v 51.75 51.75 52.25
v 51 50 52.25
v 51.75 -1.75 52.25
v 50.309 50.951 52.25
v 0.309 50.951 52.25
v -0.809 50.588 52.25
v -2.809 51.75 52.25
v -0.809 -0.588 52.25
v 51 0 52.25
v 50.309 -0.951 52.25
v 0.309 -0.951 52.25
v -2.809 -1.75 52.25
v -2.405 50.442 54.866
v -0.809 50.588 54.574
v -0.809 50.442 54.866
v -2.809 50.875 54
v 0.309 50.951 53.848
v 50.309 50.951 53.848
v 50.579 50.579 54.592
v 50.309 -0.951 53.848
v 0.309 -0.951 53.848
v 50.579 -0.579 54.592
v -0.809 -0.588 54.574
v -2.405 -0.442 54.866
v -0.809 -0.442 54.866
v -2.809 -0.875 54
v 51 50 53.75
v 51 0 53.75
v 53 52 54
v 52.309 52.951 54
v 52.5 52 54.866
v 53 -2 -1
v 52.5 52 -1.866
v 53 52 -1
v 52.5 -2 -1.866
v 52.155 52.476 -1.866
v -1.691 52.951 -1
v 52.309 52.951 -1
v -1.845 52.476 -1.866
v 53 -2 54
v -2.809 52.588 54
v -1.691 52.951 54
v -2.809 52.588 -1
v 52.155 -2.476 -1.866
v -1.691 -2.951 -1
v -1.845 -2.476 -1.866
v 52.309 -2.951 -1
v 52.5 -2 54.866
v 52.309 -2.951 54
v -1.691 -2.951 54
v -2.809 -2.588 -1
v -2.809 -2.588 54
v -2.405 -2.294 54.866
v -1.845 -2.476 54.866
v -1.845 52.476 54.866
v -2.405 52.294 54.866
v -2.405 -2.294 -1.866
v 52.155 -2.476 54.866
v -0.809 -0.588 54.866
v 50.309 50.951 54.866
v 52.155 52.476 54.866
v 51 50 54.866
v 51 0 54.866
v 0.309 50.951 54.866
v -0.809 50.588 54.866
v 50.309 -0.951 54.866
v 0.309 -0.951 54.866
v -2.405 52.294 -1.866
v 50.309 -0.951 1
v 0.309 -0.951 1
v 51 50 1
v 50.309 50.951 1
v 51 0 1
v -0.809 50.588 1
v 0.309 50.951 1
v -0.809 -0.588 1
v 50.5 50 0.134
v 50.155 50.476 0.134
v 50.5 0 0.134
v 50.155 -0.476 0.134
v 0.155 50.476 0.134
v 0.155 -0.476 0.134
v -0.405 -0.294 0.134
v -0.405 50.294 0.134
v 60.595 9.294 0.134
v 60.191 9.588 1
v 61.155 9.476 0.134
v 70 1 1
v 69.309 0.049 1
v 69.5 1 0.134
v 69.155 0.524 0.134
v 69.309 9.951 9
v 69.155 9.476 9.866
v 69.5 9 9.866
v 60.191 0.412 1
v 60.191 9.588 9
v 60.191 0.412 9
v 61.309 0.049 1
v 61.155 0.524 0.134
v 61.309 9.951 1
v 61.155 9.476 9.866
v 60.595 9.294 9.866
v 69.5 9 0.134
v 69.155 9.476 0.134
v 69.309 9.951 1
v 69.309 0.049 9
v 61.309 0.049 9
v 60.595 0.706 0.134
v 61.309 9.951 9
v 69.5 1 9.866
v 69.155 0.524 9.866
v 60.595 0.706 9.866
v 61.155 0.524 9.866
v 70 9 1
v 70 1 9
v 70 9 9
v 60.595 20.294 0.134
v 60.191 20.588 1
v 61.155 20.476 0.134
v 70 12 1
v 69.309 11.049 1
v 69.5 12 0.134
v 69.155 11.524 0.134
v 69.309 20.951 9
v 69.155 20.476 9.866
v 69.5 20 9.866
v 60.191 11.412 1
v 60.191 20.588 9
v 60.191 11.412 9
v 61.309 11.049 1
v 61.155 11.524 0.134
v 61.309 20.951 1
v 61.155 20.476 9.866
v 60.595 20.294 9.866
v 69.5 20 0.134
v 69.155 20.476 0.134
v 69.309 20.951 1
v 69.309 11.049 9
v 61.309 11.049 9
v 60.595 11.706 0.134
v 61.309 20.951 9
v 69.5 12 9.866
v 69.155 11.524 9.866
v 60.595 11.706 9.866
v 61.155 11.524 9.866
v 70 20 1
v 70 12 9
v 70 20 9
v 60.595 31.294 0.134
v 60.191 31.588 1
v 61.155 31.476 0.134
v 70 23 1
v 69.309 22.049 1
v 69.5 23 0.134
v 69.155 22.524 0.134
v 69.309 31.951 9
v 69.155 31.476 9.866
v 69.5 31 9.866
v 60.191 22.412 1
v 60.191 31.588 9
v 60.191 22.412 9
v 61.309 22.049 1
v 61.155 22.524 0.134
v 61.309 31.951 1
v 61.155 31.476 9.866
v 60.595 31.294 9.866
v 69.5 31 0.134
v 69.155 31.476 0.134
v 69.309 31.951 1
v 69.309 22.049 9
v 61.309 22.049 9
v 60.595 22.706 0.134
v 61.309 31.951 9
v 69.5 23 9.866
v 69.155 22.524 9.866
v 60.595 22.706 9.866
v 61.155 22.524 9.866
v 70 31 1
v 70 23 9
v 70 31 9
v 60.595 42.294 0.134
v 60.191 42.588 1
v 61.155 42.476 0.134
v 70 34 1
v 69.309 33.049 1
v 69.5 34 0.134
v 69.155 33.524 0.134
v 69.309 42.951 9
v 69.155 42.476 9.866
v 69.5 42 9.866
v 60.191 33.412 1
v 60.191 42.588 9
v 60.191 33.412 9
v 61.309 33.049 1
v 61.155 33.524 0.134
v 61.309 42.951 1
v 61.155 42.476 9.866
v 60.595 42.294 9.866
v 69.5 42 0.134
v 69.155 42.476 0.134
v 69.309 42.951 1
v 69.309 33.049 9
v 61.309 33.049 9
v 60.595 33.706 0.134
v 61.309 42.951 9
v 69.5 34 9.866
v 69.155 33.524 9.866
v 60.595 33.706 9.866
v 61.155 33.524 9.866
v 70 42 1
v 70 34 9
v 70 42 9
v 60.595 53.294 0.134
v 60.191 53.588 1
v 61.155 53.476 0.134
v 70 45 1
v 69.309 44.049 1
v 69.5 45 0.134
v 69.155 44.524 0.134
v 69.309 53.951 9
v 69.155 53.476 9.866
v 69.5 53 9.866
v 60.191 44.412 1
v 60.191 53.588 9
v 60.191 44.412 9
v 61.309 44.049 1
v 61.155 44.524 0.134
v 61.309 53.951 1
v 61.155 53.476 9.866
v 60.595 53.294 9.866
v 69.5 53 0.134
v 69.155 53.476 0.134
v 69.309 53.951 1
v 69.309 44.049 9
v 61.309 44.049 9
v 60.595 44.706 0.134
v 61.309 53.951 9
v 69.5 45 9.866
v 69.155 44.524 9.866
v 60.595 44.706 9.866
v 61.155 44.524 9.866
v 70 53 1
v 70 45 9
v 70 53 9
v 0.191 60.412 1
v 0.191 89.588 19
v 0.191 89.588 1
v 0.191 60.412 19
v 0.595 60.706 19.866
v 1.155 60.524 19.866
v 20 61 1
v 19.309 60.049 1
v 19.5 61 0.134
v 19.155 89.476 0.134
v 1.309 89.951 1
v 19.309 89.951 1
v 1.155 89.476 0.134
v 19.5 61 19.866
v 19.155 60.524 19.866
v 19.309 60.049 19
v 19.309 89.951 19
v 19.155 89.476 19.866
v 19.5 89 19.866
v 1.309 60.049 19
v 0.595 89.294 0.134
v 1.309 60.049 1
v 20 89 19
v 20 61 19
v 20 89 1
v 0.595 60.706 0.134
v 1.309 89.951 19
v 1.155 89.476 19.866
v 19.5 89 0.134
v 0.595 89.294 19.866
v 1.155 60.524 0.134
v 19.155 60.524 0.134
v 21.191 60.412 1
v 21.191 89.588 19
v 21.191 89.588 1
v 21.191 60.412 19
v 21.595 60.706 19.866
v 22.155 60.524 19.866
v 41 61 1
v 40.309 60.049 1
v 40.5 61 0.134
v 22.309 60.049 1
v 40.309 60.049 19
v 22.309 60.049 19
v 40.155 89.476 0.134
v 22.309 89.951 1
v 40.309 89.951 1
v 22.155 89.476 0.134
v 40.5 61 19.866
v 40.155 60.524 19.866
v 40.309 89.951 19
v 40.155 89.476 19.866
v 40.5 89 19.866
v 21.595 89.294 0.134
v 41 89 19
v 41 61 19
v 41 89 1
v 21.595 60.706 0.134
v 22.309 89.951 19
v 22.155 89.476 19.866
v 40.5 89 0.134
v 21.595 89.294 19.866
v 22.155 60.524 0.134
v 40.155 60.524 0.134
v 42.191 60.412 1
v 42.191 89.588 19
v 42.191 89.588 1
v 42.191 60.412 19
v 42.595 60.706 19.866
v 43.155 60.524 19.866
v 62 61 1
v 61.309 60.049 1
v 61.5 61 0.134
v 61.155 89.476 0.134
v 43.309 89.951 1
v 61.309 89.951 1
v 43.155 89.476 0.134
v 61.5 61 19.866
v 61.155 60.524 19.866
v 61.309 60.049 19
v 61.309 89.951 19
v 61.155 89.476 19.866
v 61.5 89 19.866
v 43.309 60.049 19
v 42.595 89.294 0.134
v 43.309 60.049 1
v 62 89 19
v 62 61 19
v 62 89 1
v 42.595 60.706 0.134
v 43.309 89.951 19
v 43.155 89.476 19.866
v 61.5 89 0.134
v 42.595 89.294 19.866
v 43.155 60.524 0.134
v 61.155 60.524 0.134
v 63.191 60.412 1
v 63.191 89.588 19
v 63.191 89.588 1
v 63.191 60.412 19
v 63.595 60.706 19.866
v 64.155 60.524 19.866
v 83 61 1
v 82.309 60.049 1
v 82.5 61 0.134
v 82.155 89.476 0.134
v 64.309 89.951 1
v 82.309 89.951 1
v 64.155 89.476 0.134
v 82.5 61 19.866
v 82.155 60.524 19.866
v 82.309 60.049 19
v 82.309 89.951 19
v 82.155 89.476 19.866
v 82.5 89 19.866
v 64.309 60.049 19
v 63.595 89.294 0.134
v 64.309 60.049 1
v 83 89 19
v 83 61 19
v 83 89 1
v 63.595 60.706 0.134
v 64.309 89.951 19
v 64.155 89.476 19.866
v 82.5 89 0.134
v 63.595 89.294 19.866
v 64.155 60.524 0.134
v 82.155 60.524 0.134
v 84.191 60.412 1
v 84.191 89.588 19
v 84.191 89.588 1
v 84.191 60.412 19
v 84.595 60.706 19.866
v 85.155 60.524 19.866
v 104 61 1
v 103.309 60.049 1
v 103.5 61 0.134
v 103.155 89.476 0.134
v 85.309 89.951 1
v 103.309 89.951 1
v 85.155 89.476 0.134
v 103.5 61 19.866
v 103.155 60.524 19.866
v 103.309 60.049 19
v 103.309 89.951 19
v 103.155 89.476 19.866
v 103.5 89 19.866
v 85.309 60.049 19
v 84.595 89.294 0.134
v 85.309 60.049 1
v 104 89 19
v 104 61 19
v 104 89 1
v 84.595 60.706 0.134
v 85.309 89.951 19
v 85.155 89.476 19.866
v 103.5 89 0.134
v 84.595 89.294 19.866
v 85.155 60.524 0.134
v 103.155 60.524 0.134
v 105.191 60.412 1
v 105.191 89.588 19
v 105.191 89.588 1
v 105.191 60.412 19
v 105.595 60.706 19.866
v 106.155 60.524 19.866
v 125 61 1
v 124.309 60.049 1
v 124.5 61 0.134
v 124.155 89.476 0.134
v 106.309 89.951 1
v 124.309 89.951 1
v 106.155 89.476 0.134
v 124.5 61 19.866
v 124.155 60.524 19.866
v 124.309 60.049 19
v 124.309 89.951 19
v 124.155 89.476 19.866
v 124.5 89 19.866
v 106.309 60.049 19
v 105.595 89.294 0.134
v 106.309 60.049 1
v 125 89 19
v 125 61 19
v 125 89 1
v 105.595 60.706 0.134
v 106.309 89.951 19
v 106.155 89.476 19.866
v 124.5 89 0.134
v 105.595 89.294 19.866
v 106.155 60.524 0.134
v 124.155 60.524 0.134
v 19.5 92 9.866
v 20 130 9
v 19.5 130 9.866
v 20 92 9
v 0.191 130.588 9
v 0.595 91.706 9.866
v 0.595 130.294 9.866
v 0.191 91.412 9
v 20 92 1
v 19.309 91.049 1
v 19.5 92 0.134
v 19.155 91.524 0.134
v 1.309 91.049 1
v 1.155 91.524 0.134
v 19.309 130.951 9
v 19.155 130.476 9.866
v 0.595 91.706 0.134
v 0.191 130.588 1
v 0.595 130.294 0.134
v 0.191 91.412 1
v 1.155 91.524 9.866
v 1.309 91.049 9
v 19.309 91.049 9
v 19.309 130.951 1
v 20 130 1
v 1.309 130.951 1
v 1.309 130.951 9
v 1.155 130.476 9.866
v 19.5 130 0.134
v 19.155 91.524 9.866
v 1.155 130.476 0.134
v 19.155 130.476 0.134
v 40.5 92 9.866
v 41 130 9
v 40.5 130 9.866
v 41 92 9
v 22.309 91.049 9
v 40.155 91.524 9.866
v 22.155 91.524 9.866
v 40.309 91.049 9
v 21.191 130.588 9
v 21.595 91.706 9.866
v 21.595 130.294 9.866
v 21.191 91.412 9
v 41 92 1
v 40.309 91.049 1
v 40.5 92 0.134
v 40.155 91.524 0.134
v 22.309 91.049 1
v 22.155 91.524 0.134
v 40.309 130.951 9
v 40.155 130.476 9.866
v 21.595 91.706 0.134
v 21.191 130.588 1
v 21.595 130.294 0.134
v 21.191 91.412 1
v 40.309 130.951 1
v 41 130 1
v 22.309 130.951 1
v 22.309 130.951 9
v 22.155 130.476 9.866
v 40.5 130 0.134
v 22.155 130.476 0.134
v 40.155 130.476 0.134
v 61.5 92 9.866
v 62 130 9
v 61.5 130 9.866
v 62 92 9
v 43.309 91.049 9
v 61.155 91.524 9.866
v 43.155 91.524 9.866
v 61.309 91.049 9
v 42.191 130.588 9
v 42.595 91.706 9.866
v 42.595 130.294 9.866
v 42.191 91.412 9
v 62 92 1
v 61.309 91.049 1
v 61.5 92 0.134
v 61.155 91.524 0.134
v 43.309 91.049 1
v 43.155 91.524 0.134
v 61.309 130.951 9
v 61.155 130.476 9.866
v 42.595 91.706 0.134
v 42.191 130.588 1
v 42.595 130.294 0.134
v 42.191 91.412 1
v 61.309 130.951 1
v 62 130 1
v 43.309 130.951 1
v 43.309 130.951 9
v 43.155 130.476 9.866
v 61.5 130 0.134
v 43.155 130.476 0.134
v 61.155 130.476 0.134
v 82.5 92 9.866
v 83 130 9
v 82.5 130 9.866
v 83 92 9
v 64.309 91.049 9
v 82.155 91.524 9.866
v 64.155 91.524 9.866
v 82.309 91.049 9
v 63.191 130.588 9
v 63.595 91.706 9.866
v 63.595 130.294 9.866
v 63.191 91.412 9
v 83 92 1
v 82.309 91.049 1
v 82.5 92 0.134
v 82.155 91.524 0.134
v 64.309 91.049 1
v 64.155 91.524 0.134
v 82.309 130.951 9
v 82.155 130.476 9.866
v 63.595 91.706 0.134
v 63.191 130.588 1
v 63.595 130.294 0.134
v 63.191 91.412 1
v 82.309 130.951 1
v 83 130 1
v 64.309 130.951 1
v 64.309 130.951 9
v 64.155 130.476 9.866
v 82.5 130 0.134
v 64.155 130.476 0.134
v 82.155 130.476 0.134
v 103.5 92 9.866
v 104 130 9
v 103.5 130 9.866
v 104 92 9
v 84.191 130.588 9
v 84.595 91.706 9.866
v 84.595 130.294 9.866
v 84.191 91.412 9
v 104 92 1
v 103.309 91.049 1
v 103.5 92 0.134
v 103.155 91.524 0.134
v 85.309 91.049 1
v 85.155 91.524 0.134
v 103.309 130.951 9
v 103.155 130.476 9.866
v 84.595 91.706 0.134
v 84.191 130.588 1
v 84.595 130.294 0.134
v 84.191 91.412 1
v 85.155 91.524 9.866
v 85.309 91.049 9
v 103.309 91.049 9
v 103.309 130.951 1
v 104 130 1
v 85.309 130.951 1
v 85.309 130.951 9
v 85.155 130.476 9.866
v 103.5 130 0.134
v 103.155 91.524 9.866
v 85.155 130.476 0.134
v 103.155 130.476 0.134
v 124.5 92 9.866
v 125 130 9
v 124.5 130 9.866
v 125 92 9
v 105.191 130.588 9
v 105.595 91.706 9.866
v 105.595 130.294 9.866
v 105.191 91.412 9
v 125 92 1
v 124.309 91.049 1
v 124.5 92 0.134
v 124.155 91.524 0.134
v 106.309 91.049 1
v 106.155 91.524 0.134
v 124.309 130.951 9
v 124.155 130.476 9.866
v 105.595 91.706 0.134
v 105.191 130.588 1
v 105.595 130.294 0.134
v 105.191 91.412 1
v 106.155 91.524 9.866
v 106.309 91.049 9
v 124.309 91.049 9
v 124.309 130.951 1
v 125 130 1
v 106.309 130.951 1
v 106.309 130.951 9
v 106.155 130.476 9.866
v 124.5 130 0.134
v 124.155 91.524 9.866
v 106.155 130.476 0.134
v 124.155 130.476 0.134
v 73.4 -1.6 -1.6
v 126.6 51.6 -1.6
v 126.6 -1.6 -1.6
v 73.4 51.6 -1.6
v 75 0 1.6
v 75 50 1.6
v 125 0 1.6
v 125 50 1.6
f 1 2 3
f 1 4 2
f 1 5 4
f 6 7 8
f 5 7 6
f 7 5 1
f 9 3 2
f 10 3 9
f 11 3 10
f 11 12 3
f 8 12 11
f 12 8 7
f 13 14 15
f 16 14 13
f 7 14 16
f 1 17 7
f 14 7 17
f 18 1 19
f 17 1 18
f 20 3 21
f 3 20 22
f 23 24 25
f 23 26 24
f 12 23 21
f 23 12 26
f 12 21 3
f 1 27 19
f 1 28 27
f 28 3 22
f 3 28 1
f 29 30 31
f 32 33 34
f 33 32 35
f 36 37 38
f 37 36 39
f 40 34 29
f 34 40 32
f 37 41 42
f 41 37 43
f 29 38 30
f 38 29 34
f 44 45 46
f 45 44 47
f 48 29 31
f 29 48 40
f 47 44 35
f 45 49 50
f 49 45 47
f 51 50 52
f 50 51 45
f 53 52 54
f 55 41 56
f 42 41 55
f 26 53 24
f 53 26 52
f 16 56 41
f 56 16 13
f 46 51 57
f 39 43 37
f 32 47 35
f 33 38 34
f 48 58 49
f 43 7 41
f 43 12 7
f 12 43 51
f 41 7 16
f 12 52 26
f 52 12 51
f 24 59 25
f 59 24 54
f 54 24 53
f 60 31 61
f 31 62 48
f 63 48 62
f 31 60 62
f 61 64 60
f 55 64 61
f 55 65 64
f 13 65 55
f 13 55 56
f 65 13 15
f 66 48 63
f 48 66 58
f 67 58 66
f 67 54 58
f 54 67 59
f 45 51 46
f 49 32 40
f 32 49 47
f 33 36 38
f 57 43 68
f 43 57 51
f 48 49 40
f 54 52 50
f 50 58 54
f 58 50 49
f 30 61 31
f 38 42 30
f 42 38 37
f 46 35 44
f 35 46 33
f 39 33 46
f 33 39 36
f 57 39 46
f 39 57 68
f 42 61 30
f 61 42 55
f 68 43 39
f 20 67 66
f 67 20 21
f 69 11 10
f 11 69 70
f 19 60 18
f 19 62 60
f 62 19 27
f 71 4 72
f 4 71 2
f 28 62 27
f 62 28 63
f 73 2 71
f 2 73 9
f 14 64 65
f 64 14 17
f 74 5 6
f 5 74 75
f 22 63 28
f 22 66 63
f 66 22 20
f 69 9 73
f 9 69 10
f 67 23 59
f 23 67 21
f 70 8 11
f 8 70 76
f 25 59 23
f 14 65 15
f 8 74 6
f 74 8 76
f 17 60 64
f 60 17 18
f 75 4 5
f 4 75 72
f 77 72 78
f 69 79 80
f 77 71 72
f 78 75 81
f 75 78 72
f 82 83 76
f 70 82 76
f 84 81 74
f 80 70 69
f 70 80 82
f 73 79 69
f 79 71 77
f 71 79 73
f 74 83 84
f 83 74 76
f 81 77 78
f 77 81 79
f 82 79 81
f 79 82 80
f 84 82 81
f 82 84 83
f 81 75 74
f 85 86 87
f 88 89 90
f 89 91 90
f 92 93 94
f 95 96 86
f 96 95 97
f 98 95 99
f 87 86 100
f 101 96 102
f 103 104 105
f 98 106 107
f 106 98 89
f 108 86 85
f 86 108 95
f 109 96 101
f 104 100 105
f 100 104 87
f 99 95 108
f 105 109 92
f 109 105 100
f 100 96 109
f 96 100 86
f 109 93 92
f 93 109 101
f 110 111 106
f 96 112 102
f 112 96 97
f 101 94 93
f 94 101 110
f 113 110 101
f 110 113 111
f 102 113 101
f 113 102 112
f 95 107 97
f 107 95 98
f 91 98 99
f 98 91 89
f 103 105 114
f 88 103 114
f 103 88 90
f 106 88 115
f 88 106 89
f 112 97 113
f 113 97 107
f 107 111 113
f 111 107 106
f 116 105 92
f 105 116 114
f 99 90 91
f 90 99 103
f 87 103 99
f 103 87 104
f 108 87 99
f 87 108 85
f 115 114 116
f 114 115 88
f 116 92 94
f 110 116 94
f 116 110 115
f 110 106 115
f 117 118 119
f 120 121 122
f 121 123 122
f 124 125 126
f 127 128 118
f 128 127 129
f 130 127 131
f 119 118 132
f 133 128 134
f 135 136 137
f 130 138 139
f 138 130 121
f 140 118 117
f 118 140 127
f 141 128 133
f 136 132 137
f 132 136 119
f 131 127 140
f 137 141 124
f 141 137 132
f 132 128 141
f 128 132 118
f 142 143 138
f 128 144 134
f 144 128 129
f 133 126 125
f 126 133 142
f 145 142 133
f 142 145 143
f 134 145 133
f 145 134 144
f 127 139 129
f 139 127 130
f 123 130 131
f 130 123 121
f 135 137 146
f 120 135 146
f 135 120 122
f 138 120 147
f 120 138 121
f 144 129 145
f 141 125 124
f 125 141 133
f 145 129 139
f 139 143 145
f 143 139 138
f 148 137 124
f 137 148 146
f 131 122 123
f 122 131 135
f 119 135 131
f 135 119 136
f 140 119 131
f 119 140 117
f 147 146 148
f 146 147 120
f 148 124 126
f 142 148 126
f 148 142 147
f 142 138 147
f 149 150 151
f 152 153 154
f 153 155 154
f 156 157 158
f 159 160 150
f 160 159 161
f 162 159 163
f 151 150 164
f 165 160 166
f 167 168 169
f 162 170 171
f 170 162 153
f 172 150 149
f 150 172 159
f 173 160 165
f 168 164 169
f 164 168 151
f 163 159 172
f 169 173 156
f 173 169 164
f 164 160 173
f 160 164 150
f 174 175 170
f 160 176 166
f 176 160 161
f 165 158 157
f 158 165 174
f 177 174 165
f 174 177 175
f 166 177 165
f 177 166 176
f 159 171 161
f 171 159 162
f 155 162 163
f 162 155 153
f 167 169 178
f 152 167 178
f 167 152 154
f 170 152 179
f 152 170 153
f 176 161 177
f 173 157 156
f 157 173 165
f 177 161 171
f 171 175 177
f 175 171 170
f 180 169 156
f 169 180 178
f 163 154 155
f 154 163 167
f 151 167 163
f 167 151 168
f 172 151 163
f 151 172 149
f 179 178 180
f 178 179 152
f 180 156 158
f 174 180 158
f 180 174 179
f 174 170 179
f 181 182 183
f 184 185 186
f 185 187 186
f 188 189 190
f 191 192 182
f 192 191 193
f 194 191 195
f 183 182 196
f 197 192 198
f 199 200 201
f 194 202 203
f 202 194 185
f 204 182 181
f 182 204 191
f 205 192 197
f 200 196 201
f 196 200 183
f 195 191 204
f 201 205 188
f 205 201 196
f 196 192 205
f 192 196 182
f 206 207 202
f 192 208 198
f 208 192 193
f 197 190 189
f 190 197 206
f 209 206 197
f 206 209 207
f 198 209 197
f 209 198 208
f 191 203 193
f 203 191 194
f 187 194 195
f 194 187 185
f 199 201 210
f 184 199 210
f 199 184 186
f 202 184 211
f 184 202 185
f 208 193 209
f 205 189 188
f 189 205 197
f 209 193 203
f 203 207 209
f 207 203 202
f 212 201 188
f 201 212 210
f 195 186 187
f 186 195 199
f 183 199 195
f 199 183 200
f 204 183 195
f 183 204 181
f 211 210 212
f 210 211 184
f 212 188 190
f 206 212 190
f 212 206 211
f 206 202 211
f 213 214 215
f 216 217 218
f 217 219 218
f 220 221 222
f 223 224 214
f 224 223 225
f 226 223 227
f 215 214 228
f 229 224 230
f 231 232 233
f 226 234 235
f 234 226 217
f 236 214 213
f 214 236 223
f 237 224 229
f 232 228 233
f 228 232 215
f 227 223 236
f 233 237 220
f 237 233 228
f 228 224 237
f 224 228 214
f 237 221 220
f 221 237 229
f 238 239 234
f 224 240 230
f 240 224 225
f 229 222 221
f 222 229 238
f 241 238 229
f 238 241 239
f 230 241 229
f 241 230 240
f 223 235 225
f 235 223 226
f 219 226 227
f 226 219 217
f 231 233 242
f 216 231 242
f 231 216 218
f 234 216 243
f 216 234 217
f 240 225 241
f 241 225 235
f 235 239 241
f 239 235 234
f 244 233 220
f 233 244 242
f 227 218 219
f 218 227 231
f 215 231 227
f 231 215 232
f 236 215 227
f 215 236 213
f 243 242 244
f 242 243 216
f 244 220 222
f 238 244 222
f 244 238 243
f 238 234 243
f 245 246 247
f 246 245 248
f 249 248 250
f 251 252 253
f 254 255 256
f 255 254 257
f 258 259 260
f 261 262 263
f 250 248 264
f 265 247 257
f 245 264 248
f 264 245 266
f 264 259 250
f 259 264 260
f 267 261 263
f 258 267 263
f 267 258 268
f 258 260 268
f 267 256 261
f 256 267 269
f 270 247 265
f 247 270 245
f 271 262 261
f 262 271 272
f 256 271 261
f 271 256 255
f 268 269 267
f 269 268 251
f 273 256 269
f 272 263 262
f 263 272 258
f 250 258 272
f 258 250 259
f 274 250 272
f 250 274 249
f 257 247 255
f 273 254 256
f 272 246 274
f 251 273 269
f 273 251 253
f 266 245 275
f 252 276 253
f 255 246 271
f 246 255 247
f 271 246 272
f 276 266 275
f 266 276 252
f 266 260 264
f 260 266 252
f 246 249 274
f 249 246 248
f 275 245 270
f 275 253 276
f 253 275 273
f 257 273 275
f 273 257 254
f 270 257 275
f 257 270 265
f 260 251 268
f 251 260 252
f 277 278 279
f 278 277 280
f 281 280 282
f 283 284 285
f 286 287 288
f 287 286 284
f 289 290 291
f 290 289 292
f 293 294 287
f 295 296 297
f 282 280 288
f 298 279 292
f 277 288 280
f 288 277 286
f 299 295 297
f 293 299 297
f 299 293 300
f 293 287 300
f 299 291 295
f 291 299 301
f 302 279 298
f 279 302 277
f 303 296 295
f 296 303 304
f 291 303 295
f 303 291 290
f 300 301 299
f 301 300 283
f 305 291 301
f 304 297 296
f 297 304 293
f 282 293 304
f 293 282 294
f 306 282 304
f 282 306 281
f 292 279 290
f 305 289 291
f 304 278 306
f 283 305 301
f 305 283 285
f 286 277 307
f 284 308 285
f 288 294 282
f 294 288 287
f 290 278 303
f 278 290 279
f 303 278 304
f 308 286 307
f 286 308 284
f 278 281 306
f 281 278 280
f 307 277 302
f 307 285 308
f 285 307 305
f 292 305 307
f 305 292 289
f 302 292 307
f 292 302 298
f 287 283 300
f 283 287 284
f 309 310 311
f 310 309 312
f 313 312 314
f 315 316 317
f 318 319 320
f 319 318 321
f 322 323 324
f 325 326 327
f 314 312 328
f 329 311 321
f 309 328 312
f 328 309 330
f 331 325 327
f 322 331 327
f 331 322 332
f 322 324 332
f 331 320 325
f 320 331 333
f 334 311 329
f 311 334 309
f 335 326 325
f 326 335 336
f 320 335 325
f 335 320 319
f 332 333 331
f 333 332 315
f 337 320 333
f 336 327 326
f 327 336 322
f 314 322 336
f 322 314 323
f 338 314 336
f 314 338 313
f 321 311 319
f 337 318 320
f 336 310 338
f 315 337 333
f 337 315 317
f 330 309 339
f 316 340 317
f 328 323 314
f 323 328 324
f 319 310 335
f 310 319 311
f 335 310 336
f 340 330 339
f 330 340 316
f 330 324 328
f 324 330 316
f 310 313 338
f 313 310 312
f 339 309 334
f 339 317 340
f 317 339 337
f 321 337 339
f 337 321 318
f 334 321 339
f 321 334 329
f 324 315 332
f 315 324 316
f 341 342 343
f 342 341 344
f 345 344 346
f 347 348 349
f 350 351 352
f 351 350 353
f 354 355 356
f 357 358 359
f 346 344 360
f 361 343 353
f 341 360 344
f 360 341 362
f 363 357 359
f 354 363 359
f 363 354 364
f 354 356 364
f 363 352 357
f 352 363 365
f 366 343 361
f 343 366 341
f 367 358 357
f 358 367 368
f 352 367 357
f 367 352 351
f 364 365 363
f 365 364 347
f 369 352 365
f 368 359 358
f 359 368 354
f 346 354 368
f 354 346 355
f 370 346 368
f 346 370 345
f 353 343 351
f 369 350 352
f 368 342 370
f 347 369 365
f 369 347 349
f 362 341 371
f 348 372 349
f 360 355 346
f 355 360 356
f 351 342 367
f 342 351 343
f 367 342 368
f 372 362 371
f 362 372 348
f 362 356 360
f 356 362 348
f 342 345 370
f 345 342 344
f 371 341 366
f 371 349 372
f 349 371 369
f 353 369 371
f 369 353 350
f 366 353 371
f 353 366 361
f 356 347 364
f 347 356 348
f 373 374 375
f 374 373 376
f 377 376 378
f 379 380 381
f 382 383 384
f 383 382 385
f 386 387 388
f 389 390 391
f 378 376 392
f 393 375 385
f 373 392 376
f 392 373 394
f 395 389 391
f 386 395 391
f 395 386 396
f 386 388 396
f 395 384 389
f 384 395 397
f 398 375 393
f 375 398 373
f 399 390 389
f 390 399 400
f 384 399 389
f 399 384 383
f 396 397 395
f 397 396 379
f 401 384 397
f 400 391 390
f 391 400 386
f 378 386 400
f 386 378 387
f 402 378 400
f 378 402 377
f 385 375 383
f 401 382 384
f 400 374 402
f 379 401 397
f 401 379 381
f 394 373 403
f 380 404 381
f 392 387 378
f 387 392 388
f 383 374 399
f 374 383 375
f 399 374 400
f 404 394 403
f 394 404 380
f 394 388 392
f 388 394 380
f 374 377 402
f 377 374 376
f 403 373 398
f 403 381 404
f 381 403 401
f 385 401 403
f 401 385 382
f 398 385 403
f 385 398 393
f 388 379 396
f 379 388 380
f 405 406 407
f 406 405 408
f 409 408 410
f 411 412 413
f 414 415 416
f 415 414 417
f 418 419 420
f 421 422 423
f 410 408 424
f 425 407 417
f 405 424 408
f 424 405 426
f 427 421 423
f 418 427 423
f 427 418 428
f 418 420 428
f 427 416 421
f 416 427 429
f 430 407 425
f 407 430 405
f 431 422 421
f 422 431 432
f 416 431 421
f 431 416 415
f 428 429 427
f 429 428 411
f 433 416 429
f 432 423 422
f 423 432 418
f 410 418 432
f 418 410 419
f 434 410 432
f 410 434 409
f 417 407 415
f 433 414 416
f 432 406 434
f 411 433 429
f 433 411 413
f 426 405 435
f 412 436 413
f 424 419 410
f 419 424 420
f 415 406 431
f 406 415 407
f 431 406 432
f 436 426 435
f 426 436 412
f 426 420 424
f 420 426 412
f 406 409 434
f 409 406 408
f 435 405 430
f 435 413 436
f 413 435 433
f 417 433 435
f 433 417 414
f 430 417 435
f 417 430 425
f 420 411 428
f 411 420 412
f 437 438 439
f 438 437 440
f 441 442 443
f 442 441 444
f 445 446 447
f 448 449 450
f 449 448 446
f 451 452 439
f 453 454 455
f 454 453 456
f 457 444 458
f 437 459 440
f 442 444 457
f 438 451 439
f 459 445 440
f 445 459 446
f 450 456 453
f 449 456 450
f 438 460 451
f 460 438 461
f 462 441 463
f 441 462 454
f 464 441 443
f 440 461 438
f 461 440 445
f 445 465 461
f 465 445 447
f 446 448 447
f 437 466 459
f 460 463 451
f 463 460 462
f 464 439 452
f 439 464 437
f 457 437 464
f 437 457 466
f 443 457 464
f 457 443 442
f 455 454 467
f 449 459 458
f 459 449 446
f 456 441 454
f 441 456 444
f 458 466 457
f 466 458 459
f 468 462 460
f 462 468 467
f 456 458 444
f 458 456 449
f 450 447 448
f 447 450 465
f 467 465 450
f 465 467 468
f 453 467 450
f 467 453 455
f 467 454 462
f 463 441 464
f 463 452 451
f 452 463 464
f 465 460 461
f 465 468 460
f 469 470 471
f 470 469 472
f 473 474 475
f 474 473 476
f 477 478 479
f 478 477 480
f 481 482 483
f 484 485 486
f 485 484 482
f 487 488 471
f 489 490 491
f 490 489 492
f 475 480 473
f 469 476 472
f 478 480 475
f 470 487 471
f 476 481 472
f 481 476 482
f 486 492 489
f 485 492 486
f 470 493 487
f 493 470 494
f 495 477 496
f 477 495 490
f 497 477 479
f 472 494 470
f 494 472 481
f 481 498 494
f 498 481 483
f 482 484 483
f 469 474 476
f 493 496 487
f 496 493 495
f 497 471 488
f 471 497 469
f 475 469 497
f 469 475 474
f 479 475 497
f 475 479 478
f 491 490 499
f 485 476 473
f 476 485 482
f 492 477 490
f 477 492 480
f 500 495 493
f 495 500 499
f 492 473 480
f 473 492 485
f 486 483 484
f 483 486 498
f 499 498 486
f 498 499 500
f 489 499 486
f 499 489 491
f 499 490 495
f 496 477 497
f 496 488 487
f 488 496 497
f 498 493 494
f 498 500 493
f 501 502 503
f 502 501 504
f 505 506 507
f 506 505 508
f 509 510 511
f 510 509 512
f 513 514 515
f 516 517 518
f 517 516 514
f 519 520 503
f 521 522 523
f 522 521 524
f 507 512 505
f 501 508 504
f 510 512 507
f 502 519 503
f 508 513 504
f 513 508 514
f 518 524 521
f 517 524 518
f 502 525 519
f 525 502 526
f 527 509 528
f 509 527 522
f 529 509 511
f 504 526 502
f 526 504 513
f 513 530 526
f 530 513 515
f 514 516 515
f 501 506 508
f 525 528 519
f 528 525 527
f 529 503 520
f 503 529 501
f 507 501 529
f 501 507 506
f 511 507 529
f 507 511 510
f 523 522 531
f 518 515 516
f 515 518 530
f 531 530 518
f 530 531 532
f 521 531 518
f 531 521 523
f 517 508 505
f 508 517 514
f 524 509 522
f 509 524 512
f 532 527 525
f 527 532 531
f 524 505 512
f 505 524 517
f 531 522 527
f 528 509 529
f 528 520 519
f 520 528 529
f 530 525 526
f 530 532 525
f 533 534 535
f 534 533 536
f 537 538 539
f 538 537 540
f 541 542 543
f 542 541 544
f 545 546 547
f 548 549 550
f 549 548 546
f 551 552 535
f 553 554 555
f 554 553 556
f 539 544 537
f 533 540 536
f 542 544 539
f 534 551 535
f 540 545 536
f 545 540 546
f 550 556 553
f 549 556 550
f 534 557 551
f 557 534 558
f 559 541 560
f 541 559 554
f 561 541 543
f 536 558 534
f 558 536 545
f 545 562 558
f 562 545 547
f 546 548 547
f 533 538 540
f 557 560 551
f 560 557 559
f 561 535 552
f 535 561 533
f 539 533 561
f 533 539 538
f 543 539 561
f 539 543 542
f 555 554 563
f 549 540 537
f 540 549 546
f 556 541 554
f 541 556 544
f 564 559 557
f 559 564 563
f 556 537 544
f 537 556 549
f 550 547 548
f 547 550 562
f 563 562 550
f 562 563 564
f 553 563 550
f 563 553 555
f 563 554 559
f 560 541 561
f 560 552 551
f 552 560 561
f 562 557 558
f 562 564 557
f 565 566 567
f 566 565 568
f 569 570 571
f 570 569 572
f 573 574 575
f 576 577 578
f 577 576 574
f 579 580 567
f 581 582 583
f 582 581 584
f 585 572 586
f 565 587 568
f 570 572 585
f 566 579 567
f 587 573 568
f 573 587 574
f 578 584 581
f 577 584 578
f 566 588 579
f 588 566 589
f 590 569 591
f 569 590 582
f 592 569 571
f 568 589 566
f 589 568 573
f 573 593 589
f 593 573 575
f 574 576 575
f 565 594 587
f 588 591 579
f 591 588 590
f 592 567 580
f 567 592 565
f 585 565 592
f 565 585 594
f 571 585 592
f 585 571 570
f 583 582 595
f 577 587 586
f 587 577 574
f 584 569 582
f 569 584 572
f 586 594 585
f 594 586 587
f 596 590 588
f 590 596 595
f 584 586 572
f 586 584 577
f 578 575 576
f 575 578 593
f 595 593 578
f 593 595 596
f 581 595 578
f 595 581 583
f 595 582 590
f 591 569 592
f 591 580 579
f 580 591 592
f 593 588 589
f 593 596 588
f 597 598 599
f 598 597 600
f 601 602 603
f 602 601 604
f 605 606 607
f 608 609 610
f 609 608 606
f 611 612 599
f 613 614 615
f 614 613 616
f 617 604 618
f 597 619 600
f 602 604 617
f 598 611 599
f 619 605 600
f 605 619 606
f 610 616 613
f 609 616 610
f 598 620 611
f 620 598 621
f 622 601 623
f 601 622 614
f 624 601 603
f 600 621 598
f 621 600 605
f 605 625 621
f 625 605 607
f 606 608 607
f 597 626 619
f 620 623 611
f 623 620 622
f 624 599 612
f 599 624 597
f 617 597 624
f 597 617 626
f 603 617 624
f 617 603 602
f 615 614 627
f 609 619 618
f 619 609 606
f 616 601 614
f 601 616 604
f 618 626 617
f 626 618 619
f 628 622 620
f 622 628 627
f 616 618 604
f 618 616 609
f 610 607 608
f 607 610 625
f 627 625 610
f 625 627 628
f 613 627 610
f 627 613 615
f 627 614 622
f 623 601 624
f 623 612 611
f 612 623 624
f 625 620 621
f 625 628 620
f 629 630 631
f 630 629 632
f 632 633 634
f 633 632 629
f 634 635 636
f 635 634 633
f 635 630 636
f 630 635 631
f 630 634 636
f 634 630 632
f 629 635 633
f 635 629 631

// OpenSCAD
// file: modules.scad
unit = 10;

module roundCube(dimensions, margin=1) {
  cubeDimensions = [for(d = dimensions) d - 2*margin];
  translate([margin, margin, margin])
  minkowski() {
    cube(cubeDimensions);
    sphere(r=margin, center=true);
  }
}

module lid(unit, margin=1) {
  u = 5 * unit;
  um = u + margin;

  linear_extrude(height=margin, center=true, scale=u/um)
  square(size=[um, um], center=true);
}

module puzzleBox(unit, margin=1) {
  u = 5 * unit + margin;
  2m = 2 * margin;
  hm = -margin / 2;

  translate([hm, hm, 0]) {
    color([0, 1, 0]) {
      difference() {
        // Outer cube
        translate([-margin, -margin, -margin])
        roundCube([u+2m, u+2m, u+2.5*margin]);

        // Clearing the cube
        translate([0, 0, 2m])
        roundCube([u, u, u]);
        translate([0, 0, 0])
        roundCube([u, u, u]);

        // Clearing the lid
        for(x=[0, 2.5*unit + 1])
        translate([x, 2.5*unit + 1, u+margin])
        lid(unit, 3.5);
      }
    }
  }
}
// main file
include <modules.scad>

puzzleBox(unit, 2);

for(i=[0:4]) {
  translate([6 * unit, i * (unit + 1), 0])
  roundCube([unit, unit, unit]);
}

for(i=[0:5]) {
  translate([i * (2*unit + 1), 6*unit, 0])
  roundCube([2*unit, 3*unit, 2*unit]);
}

for(i=[0:5]) {
  translate([i*(2*unit + 1), 9*unit + 1,0])
  roundCube([2*unit, 4*unit, unit]);
}

translate([10*unit,2.5*unit,0])
lid(unit, 3.2);
